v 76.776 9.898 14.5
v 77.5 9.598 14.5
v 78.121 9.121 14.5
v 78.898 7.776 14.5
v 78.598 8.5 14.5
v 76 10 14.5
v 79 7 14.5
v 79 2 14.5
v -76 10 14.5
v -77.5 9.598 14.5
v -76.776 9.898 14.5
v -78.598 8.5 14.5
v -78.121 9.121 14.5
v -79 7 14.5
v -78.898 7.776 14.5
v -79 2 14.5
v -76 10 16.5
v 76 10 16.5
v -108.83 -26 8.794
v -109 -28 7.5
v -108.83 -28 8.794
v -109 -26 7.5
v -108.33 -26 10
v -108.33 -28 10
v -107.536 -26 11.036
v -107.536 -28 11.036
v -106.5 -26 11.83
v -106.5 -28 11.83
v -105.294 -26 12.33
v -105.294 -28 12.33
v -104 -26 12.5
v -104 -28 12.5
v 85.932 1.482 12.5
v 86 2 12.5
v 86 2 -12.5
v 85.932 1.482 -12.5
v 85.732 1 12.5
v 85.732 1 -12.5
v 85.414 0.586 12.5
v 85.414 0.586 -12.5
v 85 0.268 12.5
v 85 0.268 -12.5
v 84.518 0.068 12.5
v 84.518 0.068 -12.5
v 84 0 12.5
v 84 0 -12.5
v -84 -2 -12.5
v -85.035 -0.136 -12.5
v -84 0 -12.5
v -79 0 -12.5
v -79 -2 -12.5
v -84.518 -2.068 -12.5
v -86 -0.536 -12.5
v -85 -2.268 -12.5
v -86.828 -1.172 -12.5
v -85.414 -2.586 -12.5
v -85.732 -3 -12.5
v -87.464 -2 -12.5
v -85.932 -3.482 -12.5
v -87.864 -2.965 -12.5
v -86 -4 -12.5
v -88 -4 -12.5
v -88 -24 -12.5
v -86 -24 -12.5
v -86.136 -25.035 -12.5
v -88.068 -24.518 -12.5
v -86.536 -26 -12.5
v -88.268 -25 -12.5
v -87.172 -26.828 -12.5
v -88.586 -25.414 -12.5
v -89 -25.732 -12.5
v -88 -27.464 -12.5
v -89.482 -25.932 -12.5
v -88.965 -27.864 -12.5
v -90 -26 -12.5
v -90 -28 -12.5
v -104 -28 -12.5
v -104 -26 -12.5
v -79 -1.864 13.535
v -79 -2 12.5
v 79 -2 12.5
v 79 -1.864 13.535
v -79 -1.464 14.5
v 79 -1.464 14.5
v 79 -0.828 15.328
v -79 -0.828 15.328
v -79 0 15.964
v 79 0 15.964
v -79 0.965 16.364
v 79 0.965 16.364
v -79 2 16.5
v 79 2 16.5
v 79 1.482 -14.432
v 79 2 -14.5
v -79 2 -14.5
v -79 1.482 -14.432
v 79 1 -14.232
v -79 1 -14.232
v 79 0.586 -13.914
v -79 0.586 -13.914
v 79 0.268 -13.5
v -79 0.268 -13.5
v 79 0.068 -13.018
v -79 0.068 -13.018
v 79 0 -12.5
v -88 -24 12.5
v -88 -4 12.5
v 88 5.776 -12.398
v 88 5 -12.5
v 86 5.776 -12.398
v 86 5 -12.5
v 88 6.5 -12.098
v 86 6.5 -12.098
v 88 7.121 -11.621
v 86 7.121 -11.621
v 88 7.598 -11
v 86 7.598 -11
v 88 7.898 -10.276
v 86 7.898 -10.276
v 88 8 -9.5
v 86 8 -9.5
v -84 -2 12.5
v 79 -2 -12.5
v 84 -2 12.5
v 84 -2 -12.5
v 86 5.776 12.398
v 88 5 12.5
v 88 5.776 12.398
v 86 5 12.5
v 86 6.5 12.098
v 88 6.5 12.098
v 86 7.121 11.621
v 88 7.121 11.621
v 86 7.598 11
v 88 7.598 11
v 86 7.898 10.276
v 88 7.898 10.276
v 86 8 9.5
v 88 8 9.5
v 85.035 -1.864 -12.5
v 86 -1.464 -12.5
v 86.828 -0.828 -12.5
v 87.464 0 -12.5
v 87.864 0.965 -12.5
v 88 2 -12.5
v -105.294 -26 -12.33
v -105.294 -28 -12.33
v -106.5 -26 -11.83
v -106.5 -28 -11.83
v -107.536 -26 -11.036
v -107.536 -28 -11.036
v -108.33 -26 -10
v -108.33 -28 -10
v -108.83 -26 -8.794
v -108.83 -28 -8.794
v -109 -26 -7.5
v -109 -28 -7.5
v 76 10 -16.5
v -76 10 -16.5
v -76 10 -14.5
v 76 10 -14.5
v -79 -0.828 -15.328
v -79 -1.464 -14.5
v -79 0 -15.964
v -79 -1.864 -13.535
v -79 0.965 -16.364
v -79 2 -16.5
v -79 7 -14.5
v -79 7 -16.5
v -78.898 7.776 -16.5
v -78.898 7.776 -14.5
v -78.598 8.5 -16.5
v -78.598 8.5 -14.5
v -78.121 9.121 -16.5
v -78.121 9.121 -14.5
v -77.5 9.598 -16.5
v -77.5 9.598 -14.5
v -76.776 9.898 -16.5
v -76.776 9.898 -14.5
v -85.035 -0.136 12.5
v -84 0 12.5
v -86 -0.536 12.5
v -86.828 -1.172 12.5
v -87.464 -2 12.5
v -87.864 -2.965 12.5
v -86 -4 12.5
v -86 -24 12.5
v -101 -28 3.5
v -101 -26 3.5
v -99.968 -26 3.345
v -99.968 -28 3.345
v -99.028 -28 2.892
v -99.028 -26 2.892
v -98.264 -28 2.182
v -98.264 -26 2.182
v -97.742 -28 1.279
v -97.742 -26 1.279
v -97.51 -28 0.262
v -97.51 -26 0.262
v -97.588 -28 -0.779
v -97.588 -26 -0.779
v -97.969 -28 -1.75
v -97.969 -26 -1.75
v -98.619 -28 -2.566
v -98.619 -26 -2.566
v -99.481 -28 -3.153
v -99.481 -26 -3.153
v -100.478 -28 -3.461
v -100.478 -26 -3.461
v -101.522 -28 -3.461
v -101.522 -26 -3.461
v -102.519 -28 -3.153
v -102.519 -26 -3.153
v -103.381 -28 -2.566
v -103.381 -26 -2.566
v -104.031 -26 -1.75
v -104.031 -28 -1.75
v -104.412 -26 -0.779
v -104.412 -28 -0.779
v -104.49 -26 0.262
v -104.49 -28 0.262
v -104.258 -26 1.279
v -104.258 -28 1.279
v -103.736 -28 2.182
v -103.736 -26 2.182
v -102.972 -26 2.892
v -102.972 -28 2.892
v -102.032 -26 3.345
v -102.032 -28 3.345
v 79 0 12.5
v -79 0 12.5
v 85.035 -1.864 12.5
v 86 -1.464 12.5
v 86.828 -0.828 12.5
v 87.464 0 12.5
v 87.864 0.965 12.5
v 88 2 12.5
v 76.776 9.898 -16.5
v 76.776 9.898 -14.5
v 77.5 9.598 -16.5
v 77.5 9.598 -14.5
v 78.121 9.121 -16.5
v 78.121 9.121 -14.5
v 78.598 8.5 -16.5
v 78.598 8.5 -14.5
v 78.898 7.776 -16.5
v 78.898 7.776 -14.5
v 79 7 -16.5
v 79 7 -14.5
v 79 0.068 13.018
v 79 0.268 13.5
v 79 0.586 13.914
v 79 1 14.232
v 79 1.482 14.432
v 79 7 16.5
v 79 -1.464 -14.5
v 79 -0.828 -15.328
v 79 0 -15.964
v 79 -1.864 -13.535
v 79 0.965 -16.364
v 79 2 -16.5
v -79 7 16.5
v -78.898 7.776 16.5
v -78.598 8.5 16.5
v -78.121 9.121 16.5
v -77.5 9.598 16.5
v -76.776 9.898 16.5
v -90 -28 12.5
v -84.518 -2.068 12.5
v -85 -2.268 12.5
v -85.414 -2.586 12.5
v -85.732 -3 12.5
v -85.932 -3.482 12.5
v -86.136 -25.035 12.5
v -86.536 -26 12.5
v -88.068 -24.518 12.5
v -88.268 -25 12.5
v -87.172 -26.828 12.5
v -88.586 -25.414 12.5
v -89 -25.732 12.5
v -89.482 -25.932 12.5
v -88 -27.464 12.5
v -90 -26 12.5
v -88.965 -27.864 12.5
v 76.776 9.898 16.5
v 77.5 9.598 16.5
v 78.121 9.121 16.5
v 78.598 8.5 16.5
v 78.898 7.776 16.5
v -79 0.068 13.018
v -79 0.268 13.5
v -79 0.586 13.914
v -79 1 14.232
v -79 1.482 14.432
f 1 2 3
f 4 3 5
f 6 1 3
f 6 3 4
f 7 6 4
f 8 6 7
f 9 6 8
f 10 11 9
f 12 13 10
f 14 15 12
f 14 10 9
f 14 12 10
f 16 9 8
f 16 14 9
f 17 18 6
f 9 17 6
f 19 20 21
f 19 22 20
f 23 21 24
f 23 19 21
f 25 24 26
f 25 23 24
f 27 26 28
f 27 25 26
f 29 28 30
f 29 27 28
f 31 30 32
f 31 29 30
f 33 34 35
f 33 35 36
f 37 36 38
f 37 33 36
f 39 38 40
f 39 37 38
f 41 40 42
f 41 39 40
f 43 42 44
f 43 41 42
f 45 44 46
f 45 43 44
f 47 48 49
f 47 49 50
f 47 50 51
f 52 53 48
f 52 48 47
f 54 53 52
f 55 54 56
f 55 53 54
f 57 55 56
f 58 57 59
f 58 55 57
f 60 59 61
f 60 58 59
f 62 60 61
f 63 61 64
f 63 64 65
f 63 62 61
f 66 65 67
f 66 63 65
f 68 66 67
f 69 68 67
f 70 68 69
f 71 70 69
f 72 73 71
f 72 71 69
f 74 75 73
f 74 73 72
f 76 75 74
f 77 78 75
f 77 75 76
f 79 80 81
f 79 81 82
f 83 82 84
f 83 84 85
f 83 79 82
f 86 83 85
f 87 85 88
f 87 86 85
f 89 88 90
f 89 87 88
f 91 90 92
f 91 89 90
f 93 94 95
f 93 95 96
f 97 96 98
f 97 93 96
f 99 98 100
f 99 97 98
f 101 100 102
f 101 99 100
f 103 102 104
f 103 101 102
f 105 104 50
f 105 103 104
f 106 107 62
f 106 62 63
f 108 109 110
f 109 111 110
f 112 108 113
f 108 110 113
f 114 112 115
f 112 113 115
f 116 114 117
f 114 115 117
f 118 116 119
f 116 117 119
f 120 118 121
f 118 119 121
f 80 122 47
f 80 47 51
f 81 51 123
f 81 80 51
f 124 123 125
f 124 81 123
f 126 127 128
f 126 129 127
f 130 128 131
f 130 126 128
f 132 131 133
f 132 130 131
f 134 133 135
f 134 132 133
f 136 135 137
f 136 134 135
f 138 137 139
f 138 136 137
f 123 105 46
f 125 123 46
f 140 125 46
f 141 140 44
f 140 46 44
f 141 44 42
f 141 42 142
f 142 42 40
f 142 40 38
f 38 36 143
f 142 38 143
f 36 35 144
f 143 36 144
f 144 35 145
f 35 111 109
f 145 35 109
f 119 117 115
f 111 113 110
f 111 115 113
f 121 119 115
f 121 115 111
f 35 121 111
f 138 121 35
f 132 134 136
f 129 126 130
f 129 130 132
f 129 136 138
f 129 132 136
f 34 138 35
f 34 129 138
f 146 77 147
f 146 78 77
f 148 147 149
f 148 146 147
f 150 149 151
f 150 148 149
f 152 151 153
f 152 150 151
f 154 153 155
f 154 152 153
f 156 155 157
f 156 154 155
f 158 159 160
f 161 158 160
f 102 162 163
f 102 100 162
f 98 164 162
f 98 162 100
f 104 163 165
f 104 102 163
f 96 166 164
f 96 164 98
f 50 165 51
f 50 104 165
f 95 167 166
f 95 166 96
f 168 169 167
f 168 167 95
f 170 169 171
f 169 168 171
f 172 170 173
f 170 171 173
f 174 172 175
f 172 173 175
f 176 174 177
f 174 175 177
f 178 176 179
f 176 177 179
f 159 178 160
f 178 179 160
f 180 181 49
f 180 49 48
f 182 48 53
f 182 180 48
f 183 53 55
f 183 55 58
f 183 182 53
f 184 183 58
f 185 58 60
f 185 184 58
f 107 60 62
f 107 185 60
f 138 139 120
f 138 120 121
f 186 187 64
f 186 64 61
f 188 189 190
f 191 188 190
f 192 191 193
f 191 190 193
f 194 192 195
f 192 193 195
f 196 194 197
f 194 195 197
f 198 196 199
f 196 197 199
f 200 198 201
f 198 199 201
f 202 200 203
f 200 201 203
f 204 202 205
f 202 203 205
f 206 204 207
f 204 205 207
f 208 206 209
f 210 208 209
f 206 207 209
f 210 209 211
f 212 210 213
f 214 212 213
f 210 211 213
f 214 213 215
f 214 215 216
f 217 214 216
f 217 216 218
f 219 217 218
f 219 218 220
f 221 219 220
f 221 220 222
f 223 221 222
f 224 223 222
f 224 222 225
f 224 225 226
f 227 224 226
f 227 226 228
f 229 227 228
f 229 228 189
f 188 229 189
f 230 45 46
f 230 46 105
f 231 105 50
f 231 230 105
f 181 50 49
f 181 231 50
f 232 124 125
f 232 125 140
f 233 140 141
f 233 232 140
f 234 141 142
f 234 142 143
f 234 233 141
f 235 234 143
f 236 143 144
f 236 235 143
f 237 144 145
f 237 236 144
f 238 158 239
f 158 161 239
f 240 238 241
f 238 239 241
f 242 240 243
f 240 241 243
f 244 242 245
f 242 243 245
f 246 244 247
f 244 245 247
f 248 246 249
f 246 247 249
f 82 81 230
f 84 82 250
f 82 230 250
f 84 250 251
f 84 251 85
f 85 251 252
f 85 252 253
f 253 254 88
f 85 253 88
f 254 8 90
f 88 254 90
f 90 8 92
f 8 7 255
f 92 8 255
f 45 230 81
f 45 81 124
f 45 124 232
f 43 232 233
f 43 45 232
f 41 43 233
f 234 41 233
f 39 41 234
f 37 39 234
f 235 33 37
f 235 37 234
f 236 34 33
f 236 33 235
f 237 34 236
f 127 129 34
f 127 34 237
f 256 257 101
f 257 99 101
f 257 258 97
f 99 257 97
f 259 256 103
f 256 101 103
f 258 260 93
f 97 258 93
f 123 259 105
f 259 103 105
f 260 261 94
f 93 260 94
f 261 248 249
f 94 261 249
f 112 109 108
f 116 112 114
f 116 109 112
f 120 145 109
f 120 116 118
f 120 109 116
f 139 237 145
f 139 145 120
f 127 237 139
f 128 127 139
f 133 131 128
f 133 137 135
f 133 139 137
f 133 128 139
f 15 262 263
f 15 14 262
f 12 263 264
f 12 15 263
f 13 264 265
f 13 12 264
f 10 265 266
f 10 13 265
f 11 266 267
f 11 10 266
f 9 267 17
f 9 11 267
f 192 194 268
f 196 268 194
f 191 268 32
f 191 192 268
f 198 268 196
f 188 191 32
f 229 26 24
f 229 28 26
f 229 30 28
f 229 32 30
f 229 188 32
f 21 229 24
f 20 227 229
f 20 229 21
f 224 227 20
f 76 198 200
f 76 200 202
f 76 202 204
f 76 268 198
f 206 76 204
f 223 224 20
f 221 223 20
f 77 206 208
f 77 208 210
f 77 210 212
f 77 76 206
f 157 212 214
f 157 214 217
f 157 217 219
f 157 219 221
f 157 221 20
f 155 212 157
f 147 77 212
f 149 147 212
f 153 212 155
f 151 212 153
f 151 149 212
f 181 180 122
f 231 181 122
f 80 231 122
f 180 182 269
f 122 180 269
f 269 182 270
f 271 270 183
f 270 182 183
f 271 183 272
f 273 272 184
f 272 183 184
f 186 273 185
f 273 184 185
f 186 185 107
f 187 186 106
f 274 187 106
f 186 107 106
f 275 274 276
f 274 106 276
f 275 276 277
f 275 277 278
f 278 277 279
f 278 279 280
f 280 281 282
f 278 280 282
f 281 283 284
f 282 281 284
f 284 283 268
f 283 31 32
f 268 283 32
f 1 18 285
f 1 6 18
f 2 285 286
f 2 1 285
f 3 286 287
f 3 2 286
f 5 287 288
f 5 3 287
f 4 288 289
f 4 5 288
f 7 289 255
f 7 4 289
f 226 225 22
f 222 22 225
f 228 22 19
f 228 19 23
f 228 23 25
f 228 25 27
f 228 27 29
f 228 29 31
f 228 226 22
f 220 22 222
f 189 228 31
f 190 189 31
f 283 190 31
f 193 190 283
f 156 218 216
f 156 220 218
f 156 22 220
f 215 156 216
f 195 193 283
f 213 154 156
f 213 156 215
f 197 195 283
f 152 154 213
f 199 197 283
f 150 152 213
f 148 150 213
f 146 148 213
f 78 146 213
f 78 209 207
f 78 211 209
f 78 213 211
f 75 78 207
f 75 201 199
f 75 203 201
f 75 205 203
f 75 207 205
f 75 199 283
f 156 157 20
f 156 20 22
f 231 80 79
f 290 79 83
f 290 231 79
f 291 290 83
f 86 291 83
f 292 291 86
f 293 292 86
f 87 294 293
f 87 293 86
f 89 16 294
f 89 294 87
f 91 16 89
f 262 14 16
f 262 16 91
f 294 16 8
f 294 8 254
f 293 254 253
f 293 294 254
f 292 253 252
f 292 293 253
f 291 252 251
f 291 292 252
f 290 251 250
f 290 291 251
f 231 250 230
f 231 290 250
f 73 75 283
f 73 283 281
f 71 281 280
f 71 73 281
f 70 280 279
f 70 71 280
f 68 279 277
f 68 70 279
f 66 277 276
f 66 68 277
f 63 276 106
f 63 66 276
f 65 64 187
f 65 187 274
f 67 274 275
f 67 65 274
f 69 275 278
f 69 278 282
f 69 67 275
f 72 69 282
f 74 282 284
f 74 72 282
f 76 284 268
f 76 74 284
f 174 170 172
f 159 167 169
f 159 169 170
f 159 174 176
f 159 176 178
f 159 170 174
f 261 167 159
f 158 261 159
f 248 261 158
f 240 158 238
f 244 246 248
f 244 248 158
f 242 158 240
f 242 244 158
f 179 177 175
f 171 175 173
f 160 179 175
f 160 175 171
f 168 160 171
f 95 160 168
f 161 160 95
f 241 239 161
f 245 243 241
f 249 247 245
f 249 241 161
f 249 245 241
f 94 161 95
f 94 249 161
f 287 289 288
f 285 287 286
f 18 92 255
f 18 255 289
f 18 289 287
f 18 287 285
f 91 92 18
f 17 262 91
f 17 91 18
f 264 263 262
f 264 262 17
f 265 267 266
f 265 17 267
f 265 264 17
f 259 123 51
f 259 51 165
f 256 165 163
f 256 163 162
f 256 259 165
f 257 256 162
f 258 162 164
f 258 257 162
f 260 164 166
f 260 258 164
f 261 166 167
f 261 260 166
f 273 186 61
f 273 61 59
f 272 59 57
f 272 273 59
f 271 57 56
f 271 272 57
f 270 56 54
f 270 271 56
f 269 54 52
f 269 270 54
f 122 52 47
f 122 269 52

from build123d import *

# Parameters (mm, degrees)
SKETCH_1_W                  = 158
SKETCH_1_H                  = 25
SM_BASE_FLANGE_1_DEPTH      = 2
SM_EDGE_FLANGE_1_DEPTH      = 158
SM_EDGE_FLANGE_1_BEND_DEPTH = 158
SM_EDGE_FLANGE_2_DEPTH      = 25
SM_EDGE_FLANGE_3_DEPTH      = 25
SM_EDGE_FLANGE_4_DEPTH      = 25
FILLET_1_R                  = 3
SKETCH_21_R                 = 3.5
CUT_EXTRUDE_1_DEPTH         = 10
FILLET_2_R                  = 5


# Sheet-metal steps are written as plain solids
with BuildPart() as part:
    # Sketch 1 → Базовая кромка1 (new body)
    with BuildSketch(Plane(origin=(0, 0, 0), x_dir=(1, 0, 0), z_dir=(0, 1, 0))):
        Rectangle(SKETCH_1_W, SKETCH_1_H)
    extrude(amount=-SM_BASE_FLANGE_1_DEPTH)

    # Ребро-кромка1 section (across the edge) → Ребро-кромка1 (add)
    with BuildSketch(Plane(origin=(79, 0, -14.5), x_dir=(0, 0, 1), z_dir=(-1, 0, 0))):
        with BuildLine():
            Line((-2, 2), (-2, 10))
            Line((-2, 10), (0, 10))
            Line((0, 10), (0, 2))
            ThreePointArc((0, 2), (0.585786438, 0.585786438), (2, 0))
            Line((2, 0), (2, -2))
            ThreePointArc((2, -2), (-0.828427125, -0.828427125), (-2, 2))
        make_face()
    extrude(amount=SM_EDGE_FLANGE_1_DEPTH)

    # Ребро-кромка1 section 2 (across the edge) → Ребро-кромка1 bend (add)
    with BuildSketch(Plane(origin=(-79, 0, 14.5), x_dir=(0, 0, -1), z_dir=(1, 0, 0))):
        with BuildLine():
            Line((-2, 2), (-2, 10))
            Line((-2, 10), (0, 10))
            Line((0, 10), (0, 2))
            ThreePointArc((0, 2), (0.585786438, 0.585786438), (2, 0))
            Line((2, 0), (2, -2))
            ThreePointArc((2, -2), (-0.828427125, -0.828427125), (-2, 2))
        make_face()
    extrude(amount=SM_EDGE_FLANGE_1_BEND_DEPTH)

    # Ребро-кромка2 section (across the edge) → Ребро-кромка2 (add)
    with BuildSketch(Plane(origin=(86, 0, 12.5), x_dir=(-1, 0, 0), z_dir=(0, 0, -1))):
        with BuildLine():
            Line((-2, 2), (-2, 8))
            Line((-2, 8), (0, 8))
            Line((0, 8), (0, 2))
            ThreePointArc((0, 2), (0.585786438, 0.585786438), (2, 0))
            Line((2, 0), (7, 0))
            Line((7, 0), (7, -2))
            Line((7, -2), (2, -2))
            ThreePointArc((2, -2), (-0.828427125, -0.828427125), (-2, 2))
        make_face()
    extrude(amount=SM_EDGE_FLANGE_2_DEPTH)

    # Ребро-кромка3 section (across the edge) → Ребро-кромка3 (add)
    with BuildSketch(Plane(origin=(-86, -2, 12.5), x_dir=(1, 0, 0), z_dir=(0, 0, -1))):
        with BuildLine():
            Line((-2, 2), (-2, 22))
            Line((-2, 22), (0, 22))
            Line((0, 22), (0, 2))
            ThreePointArc((0, 2), (0.585786438, 0.585786438), (2, 0))
            Line((2, 0), (7, 0))
            Line((7, 0), (7, -2))
            Line((7, -2), (2, -2))
            ThreePointArc((2, -2), (-0.828427125, -0.828427125), (-2, 2))
        make_face()
    extrude(amount=SM_EDGE_FLANGE_3_DEPTH)

    # Ребро-кромка4 section (across the edge) → Ребро-кромка4 (add)
    with BuildSketch(Plane(origin=(-88, -26, -12.5), x_dir=(0, 1, 0), z_dir=(0, 0, 1))):
        with BuildLine():
            Line((-2, 2), (-2, 21))
            Line((-2, 21), (0, 21))
            Line((0, 21), (0, 2))
            ThreePointArc((0, 2), (0.585786438, 0.585786438), (2, 0))
            Line((2, 0), (2, -2))
            ThreePointArc((2, -2), (-0.828427125, -0.828427125), (-2, 2))
        make_face()
    extrude(amount=SM_EDGE_FLANGE_4_DEPTH)

    # Скругление1
    fillet_1_edges = [part.edges().sort_by_distance(p)[0] for p in [
        (79, 10, -15.5),
        (-79, 10, -15.5),
        (-79, 10, 15.5),
        (79, 10, 15.5),
        (87, 8, 12.5),
        (87, 8, -12.5),
    ]]
    fillet(fillet_1_edges, radius=FILLET_1_R)

    # Эскиз21 → Вырез-Вытянуть1 (cut)
    with BuildSketch(Plane(origin=(0, -26, 0), x_dir=(1, 0, 0), z_dir=(0, 1, 0))):
        with Locations(Location((-101, 0, 0), (0, 0, 270))):
            Circle(SKETCH_21_R)
    extrude(amount=-CUT_EXTRUDE_1_DEPTH, mode=Mode.SUBTRACT)

    # Скругление2
    fillet_2_edges = [part.edges().sort_by_distance(p)[0] for p in [
        (-109, -27, -12.5),
        (-109, -27, 12.5),
    ]]
    fillet(fillet_2_edges, radius=FILLET_2_R)


solid = part.part
